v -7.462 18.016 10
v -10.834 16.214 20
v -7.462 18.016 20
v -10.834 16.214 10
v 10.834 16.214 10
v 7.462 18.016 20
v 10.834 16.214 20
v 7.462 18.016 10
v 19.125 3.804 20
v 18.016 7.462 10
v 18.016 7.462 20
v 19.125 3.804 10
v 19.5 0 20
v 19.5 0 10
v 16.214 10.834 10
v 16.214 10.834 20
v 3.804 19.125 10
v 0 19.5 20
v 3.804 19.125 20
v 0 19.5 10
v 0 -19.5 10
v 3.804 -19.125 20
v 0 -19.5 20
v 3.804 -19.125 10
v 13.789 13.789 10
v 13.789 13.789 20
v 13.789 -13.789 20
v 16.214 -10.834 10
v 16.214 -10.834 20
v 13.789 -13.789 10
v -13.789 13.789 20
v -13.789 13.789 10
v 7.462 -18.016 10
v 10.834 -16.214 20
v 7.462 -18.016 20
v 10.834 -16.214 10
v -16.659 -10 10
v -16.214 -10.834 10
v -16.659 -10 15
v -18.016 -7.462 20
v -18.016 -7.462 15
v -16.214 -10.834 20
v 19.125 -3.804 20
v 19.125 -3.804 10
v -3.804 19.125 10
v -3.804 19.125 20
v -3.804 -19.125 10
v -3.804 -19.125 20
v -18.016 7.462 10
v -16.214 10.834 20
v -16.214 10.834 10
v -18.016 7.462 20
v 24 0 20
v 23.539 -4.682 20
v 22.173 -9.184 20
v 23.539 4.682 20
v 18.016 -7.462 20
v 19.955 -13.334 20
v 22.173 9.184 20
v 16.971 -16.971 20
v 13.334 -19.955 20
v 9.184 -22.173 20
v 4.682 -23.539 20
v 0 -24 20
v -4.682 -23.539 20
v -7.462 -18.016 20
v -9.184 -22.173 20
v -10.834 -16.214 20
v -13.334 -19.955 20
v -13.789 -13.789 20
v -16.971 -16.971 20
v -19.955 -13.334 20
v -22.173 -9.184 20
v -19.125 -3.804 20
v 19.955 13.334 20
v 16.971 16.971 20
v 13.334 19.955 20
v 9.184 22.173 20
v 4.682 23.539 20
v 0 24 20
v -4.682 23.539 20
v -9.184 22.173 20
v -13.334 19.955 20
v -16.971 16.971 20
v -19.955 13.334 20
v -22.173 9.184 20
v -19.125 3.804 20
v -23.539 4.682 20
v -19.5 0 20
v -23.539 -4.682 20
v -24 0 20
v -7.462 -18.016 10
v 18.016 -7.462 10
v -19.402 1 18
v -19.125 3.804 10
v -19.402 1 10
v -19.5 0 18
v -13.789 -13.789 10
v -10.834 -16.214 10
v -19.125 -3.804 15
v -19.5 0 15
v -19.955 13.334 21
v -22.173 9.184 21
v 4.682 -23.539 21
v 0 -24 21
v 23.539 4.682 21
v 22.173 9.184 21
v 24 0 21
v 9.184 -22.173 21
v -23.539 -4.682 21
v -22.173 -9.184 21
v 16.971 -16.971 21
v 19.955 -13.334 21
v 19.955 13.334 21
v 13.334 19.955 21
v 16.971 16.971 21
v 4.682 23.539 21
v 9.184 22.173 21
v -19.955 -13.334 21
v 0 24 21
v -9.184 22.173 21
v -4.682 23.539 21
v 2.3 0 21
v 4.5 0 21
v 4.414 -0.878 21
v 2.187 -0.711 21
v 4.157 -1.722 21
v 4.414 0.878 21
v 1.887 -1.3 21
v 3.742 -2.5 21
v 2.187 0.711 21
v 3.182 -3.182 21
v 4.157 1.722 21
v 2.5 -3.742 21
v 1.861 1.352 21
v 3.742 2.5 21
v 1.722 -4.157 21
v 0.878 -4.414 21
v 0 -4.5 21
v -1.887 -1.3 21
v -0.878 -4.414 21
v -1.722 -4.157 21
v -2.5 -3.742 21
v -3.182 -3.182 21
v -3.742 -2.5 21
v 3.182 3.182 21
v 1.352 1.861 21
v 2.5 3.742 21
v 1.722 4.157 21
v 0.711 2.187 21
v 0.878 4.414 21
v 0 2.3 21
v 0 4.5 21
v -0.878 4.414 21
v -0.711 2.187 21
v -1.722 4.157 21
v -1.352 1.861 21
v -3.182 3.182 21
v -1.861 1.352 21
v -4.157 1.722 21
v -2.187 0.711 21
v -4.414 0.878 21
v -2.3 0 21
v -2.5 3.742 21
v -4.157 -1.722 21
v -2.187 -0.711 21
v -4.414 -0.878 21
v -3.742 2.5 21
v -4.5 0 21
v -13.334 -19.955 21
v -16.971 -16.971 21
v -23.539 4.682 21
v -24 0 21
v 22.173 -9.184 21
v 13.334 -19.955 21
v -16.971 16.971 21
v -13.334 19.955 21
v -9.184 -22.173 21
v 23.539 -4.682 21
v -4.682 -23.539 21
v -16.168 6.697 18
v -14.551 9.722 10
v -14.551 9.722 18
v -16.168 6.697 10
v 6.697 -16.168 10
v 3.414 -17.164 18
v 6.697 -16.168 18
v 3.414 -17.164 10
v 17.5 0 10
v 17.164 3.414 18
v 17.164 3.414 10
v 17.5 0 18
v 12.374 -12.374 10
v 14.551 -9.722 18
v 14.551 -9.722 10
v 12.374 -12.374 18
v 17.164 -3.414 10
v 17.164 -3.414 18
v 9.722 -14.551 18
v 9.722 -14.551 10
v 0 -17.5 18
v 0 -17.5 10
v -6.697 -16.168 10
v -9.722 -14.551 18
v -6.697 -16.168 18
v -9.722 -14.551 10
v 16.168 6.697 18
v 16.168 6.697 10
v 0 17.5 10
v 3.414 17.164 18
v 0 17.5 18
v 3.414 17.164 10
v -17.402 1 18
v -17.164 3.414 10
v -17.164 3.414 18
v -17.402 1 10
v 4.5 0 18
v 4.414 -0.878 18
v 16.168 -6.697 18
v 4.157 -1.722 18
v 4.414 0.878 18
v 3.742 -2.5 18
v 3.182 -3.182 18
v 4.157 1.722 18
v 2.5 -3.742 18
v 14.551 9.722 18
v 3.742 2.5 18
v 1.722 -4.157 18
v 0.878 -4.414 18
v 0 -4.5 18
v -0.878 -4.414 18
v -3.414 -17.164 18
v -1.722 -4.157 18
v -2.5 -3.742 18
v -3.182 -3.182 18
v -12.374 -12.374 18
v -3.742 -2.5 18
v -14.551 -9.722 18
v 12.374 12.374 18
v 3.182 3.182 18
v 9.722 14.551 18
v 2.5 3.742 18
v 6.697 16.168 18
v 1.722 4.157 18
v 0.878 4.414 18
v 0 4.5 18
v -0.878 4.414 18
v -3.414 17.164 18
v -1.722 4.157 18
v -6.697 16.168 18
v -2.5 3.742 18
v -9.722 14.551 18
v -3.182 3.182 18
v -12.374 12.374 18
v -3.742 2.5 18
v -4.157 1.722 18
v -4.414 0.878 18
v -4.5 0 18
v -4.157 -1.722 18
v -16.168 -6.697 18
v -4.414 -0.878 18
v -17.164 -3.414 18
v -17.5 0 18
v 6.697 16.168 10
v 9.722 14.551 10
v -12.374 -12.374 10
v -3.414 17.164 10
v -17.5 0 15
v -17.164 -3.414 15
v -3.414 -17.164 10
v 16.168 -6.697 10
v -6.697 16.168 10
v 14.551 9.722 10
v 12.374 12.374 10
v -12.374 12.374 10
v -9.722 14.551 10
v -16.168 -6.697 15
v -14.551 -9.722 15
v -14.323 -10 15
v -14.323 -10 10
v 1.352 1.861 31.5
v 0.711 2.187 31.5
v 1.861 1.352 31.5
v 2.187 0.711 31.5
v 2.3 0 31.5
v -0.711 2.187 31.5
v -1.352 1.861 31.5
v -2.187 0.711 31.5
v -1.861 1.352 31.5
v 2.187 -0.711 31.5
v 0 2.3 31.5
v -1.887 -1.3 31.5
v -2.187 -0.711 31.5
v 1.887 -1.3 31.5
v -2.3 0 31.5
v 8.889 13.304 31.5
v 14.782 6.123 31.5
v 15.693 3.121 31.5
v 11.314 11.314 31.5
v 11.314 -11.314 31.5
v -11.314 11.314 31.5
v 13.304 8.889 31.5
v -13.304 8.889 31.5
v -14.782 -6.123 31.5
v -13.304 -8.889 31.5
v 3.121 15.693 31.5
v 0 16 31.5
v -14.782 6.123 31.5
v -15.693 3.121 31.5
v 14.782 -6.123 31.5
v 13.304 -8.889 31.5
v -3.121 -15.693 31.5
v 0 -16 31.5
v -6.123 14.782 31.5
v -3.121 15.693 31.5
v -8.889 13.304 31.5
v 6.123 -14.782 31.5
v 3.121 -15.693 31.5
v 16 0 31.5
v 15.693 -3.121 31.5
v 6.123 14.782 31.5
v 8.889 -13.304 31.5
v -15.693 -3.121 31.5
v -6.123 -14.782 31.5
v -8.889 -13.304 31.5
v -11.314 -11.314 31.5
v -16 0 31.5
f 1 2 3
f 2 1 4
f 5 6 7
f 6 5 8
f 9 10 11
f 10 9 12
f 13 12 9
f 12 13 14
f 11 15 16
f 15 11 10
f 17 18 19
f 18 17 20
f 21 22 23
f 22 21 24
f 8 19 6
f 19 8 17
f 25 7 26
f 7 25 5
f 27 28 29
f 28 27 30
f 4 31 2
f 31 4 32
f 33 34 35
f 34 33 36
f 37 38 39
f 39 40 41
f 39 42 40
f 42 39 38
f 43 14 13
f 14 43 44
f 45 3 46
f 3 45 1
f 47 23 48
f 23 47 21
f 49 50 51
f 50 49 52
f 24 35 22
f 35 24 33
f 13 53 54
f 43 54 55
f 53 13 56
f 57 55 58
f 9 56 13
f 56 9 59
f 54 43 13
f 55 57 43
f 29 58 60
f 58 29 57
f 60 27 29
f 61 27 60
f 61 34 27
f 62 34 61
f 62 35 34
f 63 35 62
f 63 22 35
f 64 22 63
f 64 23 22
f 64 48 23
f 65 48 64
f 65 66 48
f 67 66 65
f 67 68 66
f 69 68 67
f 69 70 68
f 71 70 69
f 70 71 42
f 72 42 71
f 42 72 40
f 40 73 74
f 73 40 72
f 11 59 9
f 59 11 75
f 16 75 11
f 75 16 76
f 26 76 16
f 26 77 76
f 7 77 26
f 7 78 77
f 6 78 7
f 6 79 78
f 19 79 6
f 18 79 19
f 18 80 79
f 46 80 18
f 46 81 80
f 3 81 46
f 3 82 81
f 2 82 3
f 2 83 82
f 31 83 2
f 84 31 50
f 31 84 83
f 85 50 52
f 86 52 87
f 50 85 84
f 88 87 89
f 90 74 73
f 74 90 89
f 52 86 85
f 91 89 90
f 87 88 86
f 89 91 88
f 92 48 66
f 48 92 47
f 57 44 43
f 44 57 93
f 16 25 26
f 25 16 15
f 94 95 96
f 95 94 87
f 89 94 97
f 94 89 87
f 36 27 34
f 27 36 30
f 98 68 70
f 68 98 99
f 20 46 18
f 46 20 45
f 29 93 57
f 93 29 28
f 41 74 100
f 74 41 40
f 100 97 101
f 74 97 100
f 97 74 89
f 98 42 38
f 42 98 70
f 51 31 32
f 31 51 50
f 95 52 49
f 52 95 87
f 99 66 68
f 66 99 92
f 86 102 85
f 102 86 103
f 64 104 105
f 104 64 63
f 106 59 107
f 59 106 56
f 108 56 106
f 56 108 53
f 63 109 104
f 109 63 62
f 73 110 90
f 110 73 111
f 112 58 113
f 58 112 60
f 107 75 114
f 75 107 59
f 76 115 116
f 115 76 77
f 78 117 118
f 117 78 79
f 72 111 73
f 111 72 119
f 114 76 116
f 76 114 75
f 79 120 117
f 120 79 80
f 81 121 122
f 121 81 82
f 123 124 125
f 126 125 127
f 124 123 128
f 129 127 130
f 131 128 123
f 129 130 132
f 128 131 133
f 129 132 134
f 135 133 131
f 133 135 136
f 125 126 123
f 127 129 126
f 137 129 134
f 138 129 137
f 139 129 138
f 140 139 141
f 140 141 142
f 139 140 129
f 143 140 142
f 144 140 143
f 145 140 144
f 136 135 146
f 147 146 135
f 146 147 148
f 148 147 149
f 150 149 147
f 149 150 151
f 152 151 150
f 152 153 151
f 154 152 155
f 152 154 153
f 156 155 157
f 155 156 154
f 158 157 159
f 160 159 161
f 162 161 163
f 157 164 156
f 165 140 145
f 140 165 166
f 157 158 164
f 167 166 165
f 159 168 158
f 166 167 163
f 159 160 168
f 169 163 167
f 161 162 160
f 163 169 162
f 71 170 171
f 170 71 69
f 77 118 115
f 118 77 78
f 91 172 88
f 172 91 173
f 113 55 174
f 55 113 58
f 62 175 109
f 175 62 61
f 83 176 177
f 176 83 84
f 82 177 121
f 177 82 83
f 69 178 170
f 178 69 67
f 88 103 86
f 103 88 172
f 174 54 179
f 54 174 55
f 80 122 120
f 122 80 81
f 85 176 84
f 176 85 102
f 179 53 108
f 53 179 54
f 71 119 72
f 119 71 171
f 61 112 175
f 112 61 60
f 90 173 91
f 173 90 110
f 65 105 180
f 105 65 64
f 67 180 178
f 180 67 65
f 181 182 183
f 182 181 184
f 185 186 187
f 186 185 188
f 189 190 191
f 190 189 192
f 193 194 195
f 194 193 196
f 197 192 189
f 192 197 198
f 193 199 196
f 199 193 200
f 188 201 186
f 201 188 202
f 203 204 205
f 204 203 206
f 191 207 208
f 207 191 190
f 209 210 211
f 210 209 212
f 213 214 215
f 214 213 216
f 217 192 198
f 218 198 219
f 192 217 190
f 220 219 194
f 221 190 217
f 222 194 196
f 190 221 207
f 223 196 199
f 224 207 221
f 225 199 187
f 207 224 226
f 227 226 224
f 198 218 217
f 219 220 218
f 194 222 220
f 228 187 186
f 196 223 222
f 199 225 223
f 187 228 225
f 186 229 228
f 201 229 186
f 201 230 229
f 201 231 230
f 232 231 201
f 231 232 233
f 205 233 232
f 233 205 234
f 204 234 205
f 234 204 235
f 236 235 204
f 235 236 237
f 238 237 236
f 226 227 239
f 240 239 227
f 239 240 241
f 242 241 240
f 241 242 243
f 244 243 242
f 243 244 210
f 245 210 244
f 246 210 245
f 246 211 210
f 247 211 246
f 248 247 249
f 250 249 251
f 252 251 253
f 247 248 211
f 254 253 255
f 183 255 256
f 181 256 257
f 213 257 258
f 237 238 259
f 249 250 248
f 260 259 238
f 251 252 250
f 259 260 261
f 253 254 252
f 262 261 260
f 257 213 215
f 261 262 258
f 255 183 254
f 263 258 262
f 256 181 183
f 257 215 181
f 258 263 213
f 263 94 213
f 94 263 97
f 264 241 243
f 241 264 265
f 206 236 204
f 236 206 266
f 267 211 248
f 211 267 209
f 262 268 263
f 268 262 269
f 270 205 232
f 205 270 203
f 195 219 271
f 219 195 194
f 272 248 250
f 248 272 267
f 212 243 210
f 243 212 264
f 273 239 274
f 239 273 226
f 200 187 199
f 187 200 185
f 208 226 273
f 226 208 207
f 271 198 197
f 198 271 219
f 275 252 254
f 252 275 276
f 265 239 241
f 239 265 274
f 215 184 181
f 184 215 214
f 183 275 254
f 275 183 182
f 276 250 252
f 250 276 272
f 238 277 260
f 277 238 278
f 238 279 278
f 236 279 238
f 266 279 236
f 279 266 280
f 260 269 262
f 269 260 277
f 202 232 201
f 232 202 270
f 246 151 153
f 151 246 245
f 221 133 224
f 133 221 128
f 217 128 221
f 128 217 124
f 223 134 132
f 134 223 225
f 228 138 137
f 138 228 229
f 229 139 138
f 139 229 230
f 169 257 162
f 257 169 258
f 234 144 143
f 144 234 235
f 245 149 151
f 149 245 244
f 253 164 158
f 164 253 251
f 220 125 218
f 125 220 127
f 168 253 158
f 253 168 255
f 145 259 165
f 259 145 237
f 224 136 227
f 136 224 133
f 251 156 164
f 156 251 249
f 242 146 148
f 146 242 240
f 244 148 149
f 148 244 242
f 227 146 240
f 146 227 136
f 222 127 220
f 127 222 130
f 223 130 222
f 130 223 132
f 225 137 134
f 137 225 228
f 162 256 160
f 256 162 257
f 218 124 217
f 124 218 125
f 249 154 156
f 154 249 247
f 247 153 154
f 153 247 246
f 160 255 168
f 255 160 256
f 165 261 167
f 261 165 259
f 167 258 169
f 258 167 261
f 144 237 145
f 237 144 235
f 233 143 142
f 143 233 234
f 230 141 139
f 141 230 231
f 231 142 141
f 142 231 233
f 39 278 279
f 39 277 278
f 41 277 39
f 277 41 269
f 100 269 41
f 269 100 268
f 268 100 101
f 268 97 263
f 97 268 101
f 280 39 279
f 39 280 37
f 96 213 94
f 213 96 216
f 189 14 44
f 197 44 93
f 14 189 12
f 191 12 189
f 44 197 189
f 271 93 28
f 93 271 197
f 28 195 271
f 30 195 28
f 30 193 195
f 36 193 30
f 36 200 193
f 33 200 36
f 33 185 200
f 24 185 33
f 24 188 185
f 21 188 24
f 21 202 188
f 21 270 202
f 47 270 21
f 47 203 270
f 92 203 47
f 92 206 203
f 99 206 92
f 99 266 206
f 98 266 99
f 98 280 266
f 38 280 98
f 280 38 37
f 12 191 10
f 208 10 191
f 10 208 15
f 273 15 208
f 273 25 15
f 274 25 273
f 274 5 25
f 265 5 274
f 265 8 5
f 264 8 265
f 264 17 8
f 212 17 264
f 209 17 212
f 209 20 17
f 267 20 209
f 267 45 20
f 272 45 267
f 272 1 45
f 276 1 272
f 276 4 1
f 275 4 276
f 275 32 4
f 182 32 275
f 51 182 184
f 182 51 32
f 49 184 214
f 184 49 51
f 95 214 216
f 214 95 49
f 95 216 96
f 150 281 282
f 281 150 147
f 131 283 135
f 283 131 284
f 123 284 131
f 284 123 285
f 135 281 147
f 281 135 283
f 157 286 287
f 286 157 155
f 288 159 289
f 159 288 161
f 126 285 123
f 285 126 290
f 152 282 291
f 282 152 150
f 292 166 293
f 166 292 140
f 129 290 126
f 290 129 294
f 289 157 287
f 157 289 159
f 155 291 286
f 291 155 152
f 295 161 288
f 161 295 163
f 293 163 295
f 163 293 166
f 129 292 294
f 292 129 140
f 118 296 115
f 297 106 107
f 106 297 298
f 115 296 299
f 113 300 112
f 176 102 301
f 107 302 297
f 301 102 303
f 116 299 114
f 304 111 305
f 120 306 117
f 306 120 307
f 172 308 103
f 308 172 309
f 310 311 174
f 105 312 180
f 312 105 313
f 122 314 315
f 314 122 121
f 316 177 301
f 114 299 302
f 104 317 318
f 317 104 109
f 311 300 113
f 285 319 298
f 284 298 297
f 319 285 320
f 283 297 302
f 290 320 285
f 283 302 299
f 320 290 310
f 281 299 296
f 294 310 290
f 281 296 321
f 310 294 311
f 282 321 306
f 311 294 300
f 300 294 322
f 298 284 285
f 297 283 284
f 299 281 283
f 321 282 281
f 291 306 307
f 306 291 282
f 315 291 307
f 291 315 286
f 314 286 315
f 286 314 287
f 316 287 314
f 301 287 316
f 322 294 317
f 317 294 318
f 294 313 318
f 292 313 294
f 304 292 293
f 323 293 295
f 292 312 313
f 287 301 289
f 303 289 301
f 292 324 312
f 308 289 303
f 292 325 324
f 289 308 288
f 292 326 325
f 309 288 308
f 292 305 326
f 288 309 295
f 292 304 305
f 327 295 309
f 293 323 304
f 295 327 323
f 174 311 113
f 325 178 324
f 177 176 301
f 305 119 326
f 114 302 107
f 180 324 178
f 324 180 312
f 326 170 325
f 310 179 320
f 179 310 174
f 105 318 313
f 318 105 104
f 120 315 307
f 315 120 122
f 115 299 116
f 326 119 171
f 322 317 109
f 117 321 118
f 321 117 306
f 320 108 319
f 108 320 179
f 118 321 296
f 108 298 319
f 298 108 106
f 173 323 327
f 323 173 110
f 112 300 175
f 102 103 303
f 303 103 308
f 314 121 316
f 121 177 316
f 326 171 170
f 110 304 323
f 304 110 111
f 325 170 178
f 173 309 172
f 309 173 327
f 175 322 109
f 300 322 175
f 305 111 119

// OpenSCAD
module test_rotator(w) {
    difference() {
        cylinder(10.5, d=32, $fn=32);
        translate([0, 0, -1])
        difference() {
            cylinder(21, d=w, $fn=20);
            translate([-w/2, -w/2, 0])
            translate([0, 0, -1])
            cube([w, 1, 25]);
        }
    }
}

module rotator_incline(w, dia1 = 32, dia2 = 32) {
    difference() {
        cylinder(10.5, d1=dia1, d2=dia2, $fn=32);
        translate([0, 0, -1])
        difference() {
            cylinder(21, d=w, $fn=20);
            translate([-w/2, -w/2, 0])
            translate([0, 0, -1])
            cube([w, 1, 25]);
        }
    }
}

//test_rotator(6.25);

module spool_male() {
    difference() {
    union() {
        difference () {
            difference() {
                // the center whole
                difference() {
                    // the spool
                    difference() {
                        // the edges
                        union() {
                            cylinder(1, d=48, $fn=32);
                            cylinder(20, d=39, $fn=32);
                            translate([0, 0, 20])
                            cylinder(1, d=48, $fn=32);
                        }
                        translate([0, 0, -1])
                        cylinder(19, d=35, $fn=32);
                    }
                }
                union() {
                    translate([-20, 0, 5])
                    cube([10,11,10]);
                    translate([-20, 0, 2])
                    cube([10, 1, 16]);
                }
            }
            translate([0, 0, -1])
            cylinder(11, d=48.5, $fn=31);
        }
        difference() {
            difference() {
                translate([0, 0, 2])
                cylinder(17, d=35, $fn=32);
                translate([0, 0, -1])
                cylinder(19, d=34, $fn=32);
            }
            // hack
            union() {
                translate([-20, 0, 1])
                //cube([10, 10, 14]);
                cube([10,11,14]);
                translate([-20, 0, 2])
                cube([10, 1, 16]);
            }
        }
    }
    translate([0, 0, -5])
    cylinder(40, d=9, $fn=32);
    }

}

module spool_female() {
    difference () {
        difference() {
            // the center whole
            difference() {
                // the spool
                difference() {
                    // the edges
                    union() {
                        cylinder(1, d=48, $fn=32);
                        cylinder(20, d=39, $fn=32);
                        translate([0, 0, 20])
                        cylinder(1, d=48, $fn=32);
                    }
                    translate([0, 0, -1])
                    cylinder(19, d=35, $fn=32);
                }
                //translate([0, 0, -5])
                cylinder(40, d=9, $fn=32);
            }
            union() {
                // Mirror!
                translate([-20, -10, 5])
                cube(10);
                translate([-20, 0, 2])
                cube([10, 1, 16]);
            }
        }
        translate([0, 0, -1])
        cylinder(11, d=48.5, $fn=31);
    }


    //difference() {
    //difference() {
    //    translate([0, 0, 2])
    //    cylinder(17, d=31, $fn=32);
    //    translate([0, 0, -1])
    //    cylinder(19, d=30, $fn=32);
    //}
    //// hack
    //union() {
    //    translate([-20, 0, 1])
    //    cube([10, 10, 14]);
    //    translate([-20, 0, 2])
    //    cube([10, 1, 16]);
    //}
    //}
}

module shaft() {
    difference() {
        union() {
        cube([40, 40, 2]);
        translate([20, 20, -40])
        cylinder(40, d=5, $fn=32);
        }
        translate([19.75, 15, -41])
        cube([0.5, 10, 10]);
    }
}

module spool_female_2()
{
spool_female();
translate([0,0,21])
//rotator_incline(6.25, 48);
rotator_incline(4.6, 48);
}

//spool_male();
spool_female_2();
//test_rotator(4.5);
